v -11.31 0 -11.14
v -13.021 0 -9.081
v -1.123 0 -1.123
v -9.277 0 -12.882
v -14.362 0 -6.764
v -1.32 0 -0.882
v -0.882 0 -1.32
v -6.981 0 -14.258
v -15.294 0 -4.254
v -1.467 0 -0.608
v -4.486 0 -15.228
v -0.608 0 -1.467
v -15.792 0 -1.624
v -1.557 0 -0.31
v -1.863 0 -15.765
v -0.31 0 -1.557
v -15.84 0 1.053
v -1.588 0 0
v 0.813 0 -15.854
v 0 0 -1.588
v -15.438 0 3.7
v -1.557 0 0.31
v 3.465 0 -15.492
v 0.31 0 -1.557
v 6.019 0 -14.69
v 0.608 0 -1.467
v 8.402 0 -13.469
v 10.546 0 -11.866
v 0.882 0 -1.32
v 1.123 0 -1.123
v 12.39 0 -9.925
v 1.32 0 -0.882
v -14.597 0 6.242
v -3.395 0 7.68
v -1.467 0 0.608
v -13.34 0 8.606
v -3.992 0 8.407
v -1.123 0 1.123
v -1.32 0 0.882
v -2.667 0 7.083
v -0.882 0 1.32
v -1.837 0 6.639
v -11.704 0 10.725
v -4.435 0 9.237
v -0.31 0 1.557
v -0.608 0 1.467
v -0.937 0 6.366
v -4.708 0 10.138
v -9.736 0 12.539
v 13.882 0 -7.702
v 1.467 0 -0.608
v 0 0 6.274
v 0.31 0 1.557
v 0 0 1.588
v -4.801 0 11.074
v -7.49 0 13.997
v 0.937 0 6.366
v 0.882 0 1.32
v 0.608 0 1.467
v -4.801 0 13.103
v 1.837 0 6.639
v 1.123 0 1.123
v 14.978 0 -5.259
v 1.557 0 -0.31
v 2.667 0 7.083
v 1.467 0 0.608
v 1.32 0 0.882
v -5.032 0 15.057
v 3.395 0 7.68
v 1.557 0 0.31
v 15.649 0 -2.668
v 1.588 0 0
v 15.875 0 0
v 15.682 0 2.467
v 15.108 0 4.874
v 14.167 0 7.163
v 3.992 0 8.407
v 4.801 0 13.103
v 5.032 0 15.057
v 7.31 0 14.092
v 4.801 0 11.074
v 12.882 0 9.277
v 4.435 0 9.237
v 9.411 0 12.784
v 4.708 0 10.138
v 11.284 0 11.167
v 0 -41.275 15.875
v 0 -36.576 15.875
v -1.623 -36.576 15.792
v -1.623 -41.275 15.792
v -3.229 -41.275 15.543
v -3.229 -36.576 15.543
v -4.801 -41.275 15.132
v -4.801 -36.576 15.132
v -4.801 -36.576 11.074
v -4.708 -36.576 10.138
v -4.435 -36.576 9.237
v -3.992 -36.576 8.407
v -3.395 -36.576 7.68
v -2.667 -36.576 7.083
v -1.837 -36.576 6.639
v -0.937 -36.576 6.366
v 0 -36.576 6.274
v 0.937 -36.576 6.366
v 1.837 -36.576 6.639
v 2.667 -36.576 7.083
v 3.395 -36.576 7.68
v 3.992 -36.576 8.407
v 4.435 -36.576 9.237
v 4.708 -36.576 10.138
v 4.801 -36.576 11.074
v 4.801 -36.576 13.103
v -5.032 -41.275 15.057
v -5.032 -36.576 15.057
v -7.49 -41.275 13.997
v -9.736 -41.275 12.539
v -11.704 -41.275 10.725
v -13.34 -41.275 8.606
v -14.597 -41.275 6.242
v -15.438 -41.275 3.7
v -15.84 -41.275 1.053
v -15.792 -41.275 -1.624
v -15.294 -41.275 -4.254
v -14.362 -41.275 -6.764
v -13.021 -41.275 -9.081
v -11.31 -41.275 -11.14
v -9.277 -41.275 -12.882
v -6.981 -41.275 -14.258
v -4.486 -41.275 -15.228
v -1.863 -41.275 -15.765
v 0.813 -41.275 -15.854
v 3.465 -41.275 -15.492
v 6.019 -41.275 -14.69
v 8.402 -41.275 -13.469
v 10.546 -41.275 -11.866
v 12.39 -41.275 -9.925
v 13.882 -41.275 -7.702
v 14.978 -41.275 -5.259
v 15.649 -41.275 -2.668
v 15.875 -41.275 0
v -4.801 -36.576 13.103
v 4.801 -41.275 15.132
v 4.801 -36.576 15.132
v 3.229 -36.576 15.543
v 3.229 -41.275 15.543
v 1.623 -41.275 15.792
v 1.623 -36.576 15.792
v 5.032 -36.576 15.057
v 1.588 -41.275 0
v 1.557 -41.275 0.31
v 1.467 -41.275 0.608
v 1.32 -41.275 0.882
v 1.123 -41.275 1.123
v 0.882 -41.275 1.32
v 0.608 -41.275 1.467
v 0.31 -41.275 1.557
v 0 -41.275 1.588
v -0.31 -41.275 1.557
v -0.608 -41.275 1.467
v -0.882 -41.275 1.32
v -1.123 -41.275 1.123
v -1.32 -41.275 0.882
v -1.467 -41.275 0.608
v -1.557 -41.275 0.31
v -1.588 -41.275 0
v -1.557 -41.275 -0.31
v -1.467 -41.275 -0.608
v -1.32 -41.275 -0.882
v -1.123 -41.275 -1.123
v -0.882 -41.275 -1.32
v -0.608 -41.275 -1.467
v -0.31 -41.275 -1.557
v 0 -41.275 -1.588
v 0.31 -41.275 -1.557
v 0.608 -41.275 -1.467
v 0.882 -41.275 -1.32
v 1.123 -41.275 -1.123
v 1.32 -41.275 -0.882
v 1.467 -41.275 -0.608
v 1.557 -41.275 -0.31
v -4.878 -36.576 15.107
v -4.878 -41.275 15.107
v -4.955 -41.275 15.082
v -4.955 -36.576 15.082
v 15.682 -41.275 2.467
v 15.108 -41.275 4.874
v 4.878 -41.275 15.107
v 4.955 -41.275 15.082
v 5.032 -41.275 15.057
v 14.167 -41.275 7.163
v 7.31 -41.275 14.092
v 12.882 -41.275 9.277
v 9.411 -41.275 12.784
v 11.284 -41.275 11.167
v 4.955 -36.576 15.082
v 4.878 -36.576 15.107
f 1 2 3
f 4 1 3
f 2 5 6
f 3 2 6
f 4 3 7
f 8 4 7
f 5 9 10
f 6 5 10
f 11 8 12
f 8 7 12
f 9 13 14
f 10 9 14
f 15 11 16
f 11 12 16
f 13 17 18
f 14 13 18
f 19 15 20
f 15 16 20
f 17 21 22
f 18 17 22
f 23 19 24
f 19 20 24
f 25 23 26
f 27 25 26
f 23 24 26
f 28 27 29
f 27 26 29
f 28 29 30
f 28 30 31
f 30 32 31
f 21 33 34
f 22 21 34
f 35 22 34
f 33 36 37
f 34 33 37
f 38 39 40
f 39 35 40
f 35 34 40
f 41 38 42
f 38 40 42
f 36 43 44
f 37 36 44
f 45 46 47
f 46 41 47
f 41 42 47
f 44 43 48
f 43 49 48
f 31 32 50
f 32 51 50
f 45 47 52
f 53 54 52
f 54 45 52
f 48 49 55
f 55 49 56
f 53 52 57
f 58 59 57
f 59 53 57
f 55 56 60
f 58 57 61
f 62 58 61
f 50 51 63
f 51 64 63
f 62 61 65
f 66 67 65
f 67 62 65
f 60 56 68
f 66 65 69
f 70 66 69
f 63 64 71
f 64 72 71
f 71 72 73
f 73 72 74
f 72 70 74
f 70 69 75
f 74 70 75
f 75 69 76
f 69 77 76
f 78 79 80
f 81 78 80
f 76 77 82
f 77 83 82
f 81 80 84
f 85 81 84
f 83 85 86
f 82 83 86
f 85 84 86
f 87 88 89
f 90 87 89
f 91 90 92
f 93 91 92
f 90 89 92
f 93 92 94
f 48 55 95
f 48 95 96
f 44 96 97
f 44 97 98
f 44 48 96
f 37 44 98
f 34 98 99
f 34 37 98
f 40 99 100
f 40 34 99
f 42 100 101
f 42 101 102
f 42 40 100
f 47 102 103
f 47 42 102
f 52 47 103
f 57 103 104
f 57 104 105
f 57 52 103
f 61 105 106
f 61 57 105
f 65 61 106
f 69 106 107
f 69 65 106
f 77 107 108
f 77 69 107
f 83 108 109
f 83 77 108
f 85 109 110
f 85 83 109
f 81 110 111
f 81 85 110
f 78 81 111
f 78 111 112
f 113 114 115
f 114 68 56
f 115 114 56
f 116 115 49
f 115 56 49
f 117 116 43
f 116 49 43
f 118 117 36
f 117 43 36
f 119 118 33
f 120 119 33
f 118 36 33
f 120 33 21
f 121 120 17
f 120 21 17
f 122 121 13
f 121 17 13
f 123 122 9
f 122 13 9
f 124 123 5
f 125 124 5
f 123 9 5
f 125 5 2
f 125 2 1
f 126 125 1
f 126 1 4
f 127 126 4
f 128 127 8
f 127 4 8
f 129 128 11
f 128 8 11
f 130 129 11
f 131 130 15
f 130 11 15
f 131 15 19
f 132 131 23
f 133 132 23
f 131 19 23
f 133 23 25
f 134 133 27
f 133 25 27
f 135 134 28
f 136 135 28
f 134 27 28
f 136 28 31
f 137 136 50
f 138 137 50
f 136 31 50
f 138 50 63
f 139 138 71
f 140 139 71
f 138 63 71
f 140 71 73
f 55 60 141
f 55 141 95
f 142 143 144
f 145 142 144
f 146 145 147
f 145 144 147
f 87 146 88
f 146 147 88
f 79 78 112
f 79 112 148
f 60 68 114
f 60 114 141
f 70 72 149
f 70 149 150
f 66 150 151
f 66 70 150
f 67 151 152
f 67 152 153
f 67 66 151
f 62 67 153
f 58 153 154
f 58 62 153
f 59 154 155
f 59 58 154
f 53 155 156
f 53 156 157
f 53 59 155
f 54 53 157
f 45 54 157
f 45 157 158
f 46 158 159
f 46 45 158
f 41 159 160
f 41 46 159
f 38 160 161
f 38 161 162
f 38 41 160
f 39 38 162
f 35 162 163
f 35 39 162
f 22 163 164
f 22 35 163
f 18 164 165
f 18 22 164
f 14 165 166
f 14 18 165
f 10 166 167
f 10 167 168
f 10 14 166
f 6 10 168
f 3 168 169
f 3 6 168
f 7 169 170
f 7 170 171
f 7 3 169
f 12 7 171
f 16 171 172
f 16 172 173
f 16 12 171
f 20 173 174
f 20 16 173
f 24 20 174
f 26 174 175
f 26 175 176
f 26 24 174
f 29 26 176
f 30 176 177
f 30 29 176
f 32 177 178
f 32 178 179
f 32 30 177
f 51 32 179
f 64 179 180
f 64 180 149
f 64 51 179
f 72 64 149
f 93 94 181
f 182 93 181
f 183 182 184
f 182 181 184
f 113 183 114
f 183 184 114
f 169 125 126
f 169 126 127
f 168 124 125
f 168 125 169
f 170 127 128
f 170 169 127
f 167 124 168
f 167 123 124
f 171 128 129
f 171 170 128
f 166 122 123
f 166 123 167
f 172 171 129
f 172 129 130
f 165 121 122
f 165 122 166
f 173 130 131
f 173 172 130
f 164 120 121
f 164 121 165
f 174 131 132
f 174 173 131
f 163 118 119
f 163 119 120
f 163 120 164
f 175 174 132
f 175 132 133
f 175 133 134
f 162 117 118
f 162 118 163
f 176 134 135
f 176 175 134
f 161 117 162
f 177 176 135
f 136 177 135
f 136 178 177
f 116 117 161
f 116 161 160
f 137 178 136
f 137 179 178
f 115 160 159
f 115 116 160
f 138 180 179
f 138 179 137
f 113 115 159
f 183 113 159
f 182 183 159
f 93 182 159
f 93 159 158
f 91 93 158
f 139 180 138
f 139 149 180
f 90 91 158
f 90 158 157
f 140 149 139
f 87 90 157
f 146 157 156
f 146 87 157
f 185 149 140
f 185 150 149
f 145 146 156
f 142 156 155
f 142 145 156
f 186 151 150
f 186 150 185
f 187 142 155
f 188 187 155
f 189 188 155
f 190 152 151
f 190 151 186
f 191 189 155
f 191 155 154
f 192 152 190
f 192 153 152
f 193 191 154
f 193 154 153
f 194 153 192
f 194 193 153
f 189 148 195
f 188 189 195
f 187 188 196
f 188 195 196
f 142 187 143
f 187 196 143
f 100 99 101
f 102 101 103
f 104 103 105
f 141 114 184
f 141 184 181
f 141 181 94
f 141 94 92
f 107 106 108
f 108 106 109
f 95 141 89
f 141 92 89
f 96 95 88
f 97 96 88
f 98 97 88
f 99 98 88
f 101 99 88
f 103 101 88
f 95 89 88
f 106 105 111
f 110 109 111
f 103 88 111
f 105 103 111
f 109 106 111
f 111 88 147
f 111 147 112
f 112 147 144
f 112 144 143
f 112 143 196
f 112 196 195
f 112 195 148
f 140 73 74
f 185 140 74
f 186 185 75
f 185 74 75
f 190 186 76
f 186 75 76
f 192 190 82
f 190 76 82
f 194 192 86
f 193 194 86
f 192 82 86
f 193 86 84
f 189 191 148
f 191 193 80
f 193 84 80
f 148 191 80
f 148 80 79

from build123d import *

# Parameters (mm, degrees)
F0_R     = 1.5875
F1_DEPTH = 41.275
F2_DEPTH = 36.576


with BuildPart() as f1:
    # F0 (on Front) → F1 (new body)
    with BuildSketch(Plane.XZ):
        with BuildLine():
            ThreePointArc((-5.031641, 15.056501), (-9.277347, -12.882021), (15.875, 0))
            ThreePointArc((15.875, 0), (12.882021, 9.277347), (5.031641, 15.056501))
            Line((5.031641, 15.056501), (4.8006, 13.103075))
            Line((4.8006, 13.103075), (4.8006, 11.0744))
            ThreePointArc((4.8006, 11.0744), (0, 6.2738), (-4.8006, 11.0744))
            Line((-4.8006, 11.0744), (-4.8006, 13.103075))
            Line((-4.8006, 13.103075), (-5.031641, 15.056501))
        make_face()
        Circle(F0_R, mode=Mode.SUBTRACT)
        with BuildLine():
            Line((4.8006, 13.103075), (4.8006, 15.13175))
            ThreePointArc((4.8006, 15.13175), (2.428898, 15.688087), (0, 15.875))
            ThreePointArc((0, 15.875), (3.394537, 14.468937), (4.8006, 11.0744))
            Line((4.8006, 11.0744), (4.8006, 13.103075))
        make_face()
        with BuildLine():
            ThreePointArc((-4.8006, 15.13175), (-4.916265, 15.094567), (-5.031641, 15.056501))
            Line((-5.031641, 15.056501), (-4.8006, 13.103075))
            Line((-4.8006, 13.103075), (-4.8006, 15.13175))
        make_face()
        with BuildLine():
            ThreePointArc((4.8006, 11.0744), (3.394537, 14.468937), (0, 15.875))
            ThreePointArc((0, 15.875), (-3.394537, 14.468937), (-4.8006, 11.0744))
            ThreePointArc((-4.8006, 11.0744), (0, 6.2738), (4.8006, 11.0744))
        make_face()
        with BuildLine():
            Line((4.8006, 13.103075), (5.031641, 15.056501))
            ThreePointArc((5.031641, 15.056501), (4.916265, 15.094567), (4.8006, 15.13175))
            Line((4.8006, 15.13175), (4.8006, 13.103075))
        make_face()
        with BuildLine():
            ThreePointArc((0, 15.875), (-2.428898, 15.688087), (-4.8006, 15.13175))
            Line((-4.8006, 15.13175), (-4.8006, 13.103075))
            Line((-4.8006, 13.103075), (-4.8006, 11.0744))
            ThreePointArc((-4.8006, 11.0744), (-3.394537, 14.468937), (0, 15.875))
        make_face()
    extrude(amount=F1_DEPTH)

    # F0 (on Front) → F2 (cut)
    with BuildSketch(Plane.XZ):
        with BuildLine():
            ThreePointArc((4.8006, 11.0744), (3.394537, 14.468937), (0, 15.875))
            ThreePointArc((0, 15.875), (-3.394537, 14.468937), (-4.8006, 11.0744))
            ThreePointArc((-4.8006, 11.0744), (0, 6.2738), (4.8006, 11.0744))
        make_face()
        with BuildLine():
            Line((4.8006, 13.103075), (4.8006, 15.13175))
            ThreePointArc((4.8006, 15.13175), (2.428898, 15.688087), (0, 15.875))
            ThreePointArc((0, 15.875), (3.394537, 14.468937), (4.8006, 11.0744))
            Line((4.8006, 11.0744), (4.8006, 13.103075))
        make_face()
        with BuildLine():
            ThreePointArc((0, 15.875), (-2.428898, 15.688087), (-4.8006, 15.13175))
            Line((-4.8006, 15.13175), (-4.8006, 13.103075))
            Line((-4.8006, 13.103075), (-4.8006, 11.0744))
            ThreePointArc((-4.8006, 11.0744), (-3.394537, 14.468937), (0, 15.875))
        make_face()
        with BuildLine():
            ThreePointArc((-4.8006, 15.13175), (-4.916265, 15.094567), (-5.031641, 15.056501))
            Line((-5.031641, 15.056501), (-4.8006, 13.103075))
            Line((-4.8006, 13.103075), (-4.8006, 15.13175))
        make_face()
        with BuildLine():
            Line((4.8006, 13.103075), (5.031641, 15.056501))
            ThreePointArc((5.031641, 15.056501), (4.916265, 15.094567), (4.8006, 15.13175))
            Line((4.8006, 15.13175), (4.8006, 13.103075))
        make_face()
    extrude(amount=F2_DEPTH, mode=Mode.SUBTRACT)


solid = f1.part
